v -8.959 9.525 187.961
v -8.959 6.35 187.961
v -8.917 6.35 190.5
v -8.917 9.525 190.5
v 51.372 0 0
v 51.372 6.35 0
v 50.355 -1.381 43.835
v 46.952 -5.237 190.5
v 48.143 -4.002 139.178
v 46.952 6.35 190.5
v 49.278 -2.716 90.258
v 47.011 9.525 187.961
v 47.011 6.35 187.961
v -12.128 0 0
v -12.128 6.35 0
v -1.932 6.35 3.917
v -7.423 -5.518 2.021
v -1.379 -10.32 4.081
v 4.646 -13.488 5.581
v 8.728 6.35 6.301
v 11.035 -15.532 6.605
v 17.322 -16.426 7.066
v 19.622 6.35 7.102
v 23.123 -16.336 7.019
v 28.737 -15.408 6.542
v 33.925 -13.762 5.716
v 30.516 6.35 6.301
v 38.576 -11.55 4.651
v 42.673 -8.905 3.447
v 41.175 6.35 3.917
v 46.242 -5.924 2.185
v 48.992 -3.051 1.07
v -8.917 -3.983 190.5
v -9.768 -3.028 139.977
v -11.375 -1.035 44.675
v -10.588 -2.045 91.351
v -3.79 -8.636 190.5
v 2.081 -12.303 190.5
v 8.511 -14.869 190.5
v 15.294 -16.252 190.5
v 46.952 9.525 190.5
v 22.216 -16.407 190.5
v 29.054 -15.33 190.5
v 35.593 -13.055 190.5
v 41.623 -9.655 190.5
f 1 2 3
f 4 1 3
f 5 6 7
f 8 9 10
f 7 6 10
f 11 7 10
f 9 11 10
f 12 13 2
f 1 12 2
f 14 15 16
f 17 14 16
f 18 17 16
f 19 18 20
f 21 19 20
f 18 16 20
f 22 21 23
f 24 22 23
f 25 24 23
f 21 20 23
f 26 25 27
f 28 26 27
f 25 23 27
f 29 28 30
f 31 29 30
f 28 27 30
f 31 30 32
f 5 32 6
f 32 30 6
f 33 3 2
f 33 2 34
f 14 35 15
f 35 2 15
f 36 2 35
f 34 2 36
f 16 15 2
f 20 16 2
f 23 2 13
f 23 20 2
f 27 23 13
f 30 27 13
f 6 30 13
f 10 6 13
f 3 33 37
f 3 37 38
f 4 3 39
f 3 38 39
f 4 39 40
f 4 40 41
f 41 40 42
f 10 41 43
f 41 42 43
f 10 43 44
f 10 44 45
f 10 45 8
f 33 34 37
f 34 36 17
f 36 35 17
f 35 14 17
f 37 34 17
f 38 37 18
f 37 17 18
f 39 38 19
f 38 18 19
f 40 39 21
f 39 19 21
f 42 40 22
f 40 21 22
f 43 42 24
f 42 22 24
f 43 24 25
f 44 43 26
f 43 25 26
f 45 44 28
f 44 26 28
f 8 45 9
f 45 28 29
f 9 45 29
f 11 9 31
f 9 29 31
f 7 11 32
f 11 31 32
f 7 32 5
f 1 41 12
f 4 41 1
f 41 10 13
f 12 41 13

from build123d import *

# Parameters (mm, degrees)
F0_W     = 63.5
F0_H     = 6.35
F1_DEPTH = 190.5
F3_DEPTH = 25.4
F5_DEPTH = 25.4
F7_DEPTH = 3.175


with BuildPart() as f1:
    # F0 (on Top) → F1 (new body)
    with BuildSketch(Plane.XY):
        with BuildLine():
            Line((51.371804, 0), (-12.128196, 0))
            ThreePointArc((-12.128196, 0), (19.621804, -16.493909), (51.371804, 0))
        make_face()
        with Locations((19.621804, 3.175)):
            Rectangle(F0_W, F0_H)
    extrude(amount=F1_DEPTH)

    # F2 (on face) → F3 (cut)
    with BuildSketch(Plane(origin=(0, 6.35, 0), x_dir=(-1, 0, 0), z_dir=(0, 1, 0))):
        Polygon((-51.371804, 190.5), (-51.371804, 0), (-46.952475, 190.5), align=None)
        Polygon((8.916664, 190.5), (12.128196, 0), (12.128196, 190.5), align=None)
    extrude(amount=-F3_DEPTH, mode=Mode.SUBTRACT)

    # F4 (on face) → F5 (cut)
    with BuildSketch(Plane(origin=(0, 6.35, 0), x_dir=(-1, 0, 0), z_dir=(0, 1, 0))):
        with BuildLine():
            Line((-51.371804, 0), (12.128196, 0))
            ThreePointArc((12.128196, 0), (-19.621804, 7.10176), (-51.371804, 0))
        make_face()
    extrude(amount=-F5_DEPTH, mode=Mode.SUBTRACT)

    # F6 (on face) → F7 (join)
    with BuildSketch(Plane(origin=(0, 6.35, 0), x_dir=(-1, 0, 0), z_dir=(0, 1, 0))):
        Polygon((8.916664, 190.5), (-46.952475, 190.5), (-47.011383, 187.960683), (8.959473, 187.960683), align=None)
    extrude(amount=F7_DEPTH)


solid = f1.part
